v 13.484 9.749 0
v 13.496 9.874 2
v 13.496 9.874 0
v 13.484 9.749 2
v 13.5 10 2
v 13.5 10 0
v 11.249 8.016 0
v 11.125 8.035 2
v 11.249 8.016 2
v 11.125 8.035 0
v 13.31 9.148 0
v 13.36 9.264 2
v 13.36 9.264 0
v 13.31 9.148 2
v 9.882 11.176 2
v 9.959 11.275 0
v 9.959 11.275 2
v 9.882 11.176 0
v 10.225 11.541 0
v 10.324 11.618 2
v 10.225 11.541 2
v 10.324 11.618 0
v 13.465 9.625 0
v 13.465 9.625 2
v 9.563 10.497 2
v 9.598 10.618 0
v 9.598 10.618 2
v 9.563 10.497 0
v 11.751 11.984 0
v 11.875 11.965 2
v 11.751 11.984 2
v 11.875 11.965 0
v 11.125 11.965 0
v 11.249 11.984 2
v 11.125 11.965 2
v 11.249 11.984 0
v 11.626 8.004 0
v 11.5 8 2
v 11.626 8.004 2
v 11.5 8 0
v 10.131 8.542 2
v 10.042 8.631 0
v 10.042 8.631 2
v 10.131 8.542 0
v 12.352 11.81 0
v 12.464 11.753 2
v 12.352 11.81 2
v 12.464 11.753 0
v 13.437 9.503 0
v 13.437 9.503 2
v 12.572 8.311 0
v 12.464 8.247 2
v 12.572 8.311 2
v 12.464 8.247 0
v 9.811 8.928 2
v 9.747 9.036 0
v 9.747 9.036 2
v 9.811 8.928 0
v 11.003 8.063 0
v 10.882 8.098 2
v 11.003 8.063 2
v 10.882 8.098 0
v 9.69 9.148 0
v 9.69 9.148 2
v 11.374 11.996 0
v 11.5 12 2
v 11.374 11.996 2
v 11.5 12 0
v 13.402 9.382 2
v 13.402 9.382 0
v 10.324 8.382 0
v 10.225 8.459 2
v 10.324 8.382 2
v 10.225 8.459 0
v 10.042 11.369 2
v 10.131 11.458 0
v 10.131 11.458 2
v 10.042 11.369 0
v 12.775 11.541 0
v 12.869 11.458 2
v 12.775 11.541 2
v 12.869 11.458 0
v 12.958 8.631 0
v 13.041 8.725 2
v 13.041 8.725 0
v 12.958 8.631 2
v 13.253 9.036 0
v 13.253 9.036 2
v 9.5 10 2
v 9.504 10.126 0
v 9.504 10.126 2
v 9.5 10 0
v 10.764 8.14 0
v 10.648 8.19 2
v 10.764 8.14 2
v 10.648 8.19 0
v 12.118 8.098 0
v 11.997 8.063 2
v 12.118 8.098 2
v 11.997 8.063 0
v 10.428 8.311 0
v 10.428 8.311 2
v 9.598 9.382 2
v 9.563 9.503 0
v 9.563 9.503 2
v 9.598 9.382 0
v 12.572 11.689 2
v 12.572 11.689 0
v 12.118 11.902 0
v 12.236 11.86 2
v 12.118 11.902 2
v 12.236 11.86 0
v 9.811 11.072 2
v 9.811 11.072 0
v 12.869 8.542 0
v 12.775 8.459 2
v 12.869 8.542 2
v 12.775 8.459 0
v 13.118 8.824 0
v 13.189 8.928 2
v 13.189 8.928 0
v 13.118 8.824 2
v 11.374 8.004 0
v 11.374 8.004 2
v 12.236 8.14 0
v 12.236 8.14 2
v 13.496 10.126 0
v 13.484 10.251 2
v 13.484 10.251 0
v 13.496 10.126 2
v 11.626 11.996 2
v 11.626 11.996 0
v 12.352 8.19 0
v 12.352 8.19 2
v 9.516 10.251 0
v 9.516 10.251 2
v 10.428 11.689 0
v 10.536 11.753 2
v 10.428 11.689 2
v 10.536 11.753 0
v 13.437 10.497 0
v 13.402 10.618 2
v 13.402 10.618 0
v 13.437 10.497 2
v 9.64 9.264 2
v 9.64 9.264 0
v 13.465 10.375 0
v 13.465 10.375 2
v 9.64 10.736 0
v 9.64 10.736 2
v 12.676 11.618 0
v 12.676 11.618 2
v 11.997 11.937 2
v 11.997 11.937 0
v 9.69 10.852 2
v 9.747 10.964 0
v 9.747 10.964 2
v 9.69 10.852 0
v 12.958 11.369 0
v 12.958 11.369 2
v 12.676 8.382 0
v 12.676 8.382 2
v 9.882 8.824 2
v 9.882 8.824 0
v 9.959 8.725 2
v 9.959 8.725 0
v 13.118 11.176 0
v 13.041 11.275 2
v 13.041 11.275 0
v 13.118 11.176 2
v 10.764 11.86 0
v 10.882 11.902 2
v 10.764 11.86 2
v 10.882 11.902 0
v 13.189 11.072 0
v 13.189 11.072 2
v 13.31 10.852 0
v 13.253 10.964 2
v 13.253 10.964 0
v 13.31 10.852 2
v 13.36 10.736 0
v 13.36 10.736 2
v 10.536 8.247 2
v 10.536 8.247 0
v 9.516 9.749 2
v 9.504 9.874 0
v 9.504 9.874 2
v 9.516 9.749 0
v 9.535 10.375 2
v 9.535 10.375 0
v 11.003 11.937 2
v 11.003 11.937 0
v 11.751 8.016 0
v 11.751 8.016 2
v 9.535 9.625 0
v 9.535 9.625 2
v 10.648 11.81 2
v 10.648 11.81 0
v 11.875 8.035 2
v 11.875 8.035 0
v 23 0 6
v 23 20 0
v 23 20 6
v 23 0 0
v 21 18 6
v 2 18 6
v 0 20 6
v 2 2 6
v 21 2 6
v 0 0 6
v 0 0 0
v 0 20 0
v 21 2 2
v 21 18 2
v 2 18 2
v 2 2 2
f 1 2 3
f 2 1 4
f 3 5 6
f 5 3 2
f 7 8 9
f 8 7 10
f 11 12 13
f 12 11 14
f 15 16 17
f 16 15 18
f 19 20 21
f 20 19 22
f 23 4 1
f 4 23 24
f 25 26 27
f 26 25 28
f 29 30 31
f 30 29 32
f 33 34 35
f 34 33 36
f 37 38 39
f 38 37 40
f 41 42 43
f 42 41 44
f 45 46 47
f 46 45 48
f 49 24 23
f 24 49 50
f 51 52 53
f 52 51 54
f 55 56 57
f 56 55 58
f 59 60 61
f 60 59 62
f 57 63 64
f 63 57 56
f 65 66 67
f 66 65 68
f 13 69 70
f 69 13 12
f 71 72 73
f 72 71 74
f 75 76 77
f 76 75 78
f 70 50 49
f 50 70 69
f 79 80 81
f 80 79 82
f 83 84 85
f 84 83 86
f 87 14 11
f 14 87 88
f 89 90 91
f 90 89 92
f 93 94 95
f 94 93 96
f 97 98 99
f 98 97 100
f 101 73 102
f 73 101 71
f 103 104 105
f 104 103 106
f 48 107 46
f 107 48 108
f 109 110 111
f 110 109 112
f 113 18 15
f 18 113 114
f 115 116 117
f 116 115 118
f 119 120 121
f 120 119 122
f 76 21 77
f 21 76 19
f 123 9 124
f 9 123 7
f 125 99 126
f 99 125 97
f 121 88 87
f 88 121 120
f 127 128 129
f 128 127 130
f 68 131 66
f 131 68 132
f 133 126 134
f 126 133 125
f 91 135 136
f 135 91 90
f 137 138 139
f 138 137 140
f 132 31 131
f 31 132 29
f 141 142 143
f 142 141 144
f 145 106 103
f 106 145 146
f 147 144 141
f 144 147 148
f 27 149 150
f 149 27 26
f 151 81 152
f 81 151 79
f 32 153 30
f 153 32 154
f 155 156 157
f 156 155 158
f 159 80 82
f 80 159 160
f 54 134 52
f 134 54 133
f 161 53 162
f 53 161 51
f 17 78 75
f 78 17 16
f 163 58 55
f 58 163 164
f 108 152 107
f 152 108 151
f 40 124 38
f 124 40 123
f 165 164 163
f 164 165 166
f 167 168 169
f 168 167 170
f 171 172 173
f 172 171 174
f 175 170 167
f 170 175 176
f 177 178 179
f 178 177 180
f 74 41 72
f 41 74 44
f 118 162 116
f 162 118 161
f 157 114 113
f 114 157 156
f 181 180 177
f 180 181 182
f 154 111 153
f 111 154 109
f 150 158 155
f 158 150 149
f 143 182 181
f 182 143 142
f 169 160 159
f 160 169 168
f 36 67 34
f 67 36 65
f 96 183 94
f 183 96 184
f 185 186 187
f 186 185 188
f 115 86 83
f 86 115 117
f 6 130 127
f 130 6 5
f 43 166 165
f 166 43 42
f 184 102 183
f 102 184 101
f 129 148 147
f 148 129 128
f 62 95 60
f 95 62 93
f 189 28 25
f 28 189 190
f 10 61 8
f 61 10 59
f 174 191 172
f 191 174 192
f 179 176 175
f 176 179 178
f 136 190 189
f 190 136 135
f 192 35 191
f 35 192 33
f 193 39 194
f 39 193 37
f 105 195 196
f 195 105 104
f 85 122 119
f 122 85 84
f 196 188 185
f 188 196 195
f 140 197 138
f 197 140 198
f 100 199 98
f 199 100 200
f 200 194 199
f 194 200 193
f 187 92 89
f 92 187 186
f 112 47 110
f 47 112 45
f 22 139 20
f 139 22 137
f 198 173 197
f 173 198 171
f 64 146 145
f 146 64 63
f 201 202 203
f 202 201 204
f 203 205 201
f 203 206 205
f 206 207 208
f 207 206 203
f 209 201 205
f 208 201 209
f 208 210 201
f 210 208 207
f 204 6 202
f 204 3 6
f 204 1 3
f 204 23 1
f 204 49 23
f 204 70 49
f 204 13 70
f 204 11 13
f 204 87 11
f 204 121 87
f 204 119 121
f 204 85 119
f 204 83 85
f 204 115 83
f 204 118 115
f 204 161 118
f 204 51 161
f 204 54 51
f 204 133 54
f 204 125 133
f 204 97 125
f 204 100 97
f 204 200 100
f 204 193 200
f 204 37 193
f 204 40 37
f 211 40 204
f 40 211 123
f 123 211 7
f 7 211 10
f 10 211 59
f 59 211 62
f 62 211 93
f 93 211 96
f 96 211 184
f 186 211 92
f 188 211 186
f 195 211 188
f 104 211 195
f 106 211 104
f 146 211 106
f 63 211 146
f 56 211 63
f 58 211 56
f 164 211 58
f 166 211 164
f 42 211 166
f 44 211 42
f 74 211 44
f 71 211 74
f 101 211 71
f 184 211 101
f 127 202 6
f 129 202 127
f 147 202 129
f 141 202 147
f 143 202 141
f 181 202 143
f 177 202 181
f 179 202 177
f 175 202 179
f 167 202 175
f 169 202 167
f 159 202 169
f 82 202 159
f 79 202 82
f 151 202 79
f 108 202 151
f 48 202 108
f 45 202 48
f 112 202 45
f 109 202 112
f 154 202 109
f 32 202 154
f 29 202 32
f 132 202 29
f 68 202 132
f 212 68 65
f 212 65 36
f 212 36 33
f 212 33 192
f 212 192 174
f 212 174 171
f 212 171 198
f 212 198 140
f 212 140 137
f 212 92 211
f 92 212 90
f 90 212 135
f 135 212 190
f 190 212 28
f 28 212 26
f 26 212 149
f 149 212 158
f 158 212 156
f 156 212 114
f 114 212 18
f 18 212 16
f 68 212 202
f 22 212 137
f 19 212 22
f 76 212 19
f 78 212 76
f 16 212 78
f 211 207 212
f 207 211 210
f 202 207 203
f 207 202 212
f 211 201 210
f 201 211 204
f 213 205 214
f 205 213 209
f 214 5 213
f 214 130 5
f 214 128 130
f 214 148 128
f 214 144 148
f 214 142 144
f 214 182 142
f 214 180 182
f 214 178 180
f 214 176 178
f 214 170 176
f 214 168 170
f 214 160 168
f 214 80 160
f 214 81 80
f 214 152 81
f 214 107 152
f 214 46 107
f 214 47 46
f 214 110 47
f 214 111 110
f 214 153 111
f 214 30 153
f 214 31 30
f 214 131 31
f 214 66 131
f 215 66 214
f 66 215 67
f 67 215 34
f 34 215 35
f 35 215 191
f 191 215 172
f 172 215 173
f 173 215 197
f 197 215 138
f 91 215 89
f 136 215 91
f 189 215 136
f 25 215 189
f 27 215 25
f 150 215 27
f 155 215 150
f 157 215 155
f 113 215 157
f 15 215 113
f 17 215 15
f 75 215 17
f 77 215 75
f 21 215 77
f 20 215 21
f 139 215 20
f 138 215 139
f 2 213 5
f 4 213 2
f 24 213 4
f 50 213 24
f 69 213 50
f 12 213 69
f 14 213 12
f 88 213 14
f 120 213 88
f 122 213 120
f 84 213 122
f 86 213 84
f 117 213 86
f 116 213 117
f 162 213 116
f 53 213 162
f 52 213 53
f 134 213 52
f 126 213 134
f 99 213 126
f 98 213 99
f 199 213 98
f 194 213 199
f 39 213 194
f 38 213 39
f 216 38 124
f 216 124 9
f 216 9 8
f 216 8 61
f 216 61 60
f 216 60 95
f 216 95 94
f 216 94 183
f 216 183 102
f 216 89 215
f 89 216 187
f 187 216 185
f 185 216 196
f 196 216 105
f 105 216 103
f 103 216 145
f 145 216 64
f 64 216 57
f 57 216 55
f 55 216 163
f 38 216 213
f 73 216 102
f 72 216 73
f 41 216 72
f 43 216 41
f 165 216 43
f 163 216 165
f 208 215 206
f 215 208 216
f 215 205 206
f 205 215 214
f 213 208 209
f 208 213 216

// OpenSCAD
platine_width = 15;
platine_length = 32;
platine_height = 12;
wall_width = 2;
$fn = 100;

module platine() {
    // Main board
    cube([platine_width, platine_length, platine_height]);
    
    translate([platine_width/2, 0, platine_height/2])
    rotate([90,0,0])
    cylinder(h=10, d=4);

    translate([platine_width/2, 25, platine_height/2])
    rotate([-90,0,0])
    cylinder(h=25, d=2);

}

module deckel() {
    difference() {
        translate([wall_width, wall_width, wall_width*2])
        cube([platine_width + wall_width*2, platine_height + wall_width*2, platine_length + wall_width]);
        
        translate([wall_width*2, platine_height + wall_width*2, wall_width*2])
        rotate([90, 0, 0])
        platine();

    }
}

module base() {
    difference () {
        cube ([platine_width + wall_width * 4,
               platine_height + wall_width * 4,
               wall_width * 3]);
        translate([wall_width, wall_width, wall_width])
        cube ([platine_width + wall_width * 2,
               platine_height + wall_width * 2,
               wall_width * 2]);
        translate([wall_width*2, platine_height + wall_width*2, wall_width*2])
        rotate([90, 0, 0])
        platine();
    }
}

!base();
deckel();
//translate([wall_width*2, platine_height + wall_width*2, wall_width*2])
//rotate([90, 0, 0])
//platine();
